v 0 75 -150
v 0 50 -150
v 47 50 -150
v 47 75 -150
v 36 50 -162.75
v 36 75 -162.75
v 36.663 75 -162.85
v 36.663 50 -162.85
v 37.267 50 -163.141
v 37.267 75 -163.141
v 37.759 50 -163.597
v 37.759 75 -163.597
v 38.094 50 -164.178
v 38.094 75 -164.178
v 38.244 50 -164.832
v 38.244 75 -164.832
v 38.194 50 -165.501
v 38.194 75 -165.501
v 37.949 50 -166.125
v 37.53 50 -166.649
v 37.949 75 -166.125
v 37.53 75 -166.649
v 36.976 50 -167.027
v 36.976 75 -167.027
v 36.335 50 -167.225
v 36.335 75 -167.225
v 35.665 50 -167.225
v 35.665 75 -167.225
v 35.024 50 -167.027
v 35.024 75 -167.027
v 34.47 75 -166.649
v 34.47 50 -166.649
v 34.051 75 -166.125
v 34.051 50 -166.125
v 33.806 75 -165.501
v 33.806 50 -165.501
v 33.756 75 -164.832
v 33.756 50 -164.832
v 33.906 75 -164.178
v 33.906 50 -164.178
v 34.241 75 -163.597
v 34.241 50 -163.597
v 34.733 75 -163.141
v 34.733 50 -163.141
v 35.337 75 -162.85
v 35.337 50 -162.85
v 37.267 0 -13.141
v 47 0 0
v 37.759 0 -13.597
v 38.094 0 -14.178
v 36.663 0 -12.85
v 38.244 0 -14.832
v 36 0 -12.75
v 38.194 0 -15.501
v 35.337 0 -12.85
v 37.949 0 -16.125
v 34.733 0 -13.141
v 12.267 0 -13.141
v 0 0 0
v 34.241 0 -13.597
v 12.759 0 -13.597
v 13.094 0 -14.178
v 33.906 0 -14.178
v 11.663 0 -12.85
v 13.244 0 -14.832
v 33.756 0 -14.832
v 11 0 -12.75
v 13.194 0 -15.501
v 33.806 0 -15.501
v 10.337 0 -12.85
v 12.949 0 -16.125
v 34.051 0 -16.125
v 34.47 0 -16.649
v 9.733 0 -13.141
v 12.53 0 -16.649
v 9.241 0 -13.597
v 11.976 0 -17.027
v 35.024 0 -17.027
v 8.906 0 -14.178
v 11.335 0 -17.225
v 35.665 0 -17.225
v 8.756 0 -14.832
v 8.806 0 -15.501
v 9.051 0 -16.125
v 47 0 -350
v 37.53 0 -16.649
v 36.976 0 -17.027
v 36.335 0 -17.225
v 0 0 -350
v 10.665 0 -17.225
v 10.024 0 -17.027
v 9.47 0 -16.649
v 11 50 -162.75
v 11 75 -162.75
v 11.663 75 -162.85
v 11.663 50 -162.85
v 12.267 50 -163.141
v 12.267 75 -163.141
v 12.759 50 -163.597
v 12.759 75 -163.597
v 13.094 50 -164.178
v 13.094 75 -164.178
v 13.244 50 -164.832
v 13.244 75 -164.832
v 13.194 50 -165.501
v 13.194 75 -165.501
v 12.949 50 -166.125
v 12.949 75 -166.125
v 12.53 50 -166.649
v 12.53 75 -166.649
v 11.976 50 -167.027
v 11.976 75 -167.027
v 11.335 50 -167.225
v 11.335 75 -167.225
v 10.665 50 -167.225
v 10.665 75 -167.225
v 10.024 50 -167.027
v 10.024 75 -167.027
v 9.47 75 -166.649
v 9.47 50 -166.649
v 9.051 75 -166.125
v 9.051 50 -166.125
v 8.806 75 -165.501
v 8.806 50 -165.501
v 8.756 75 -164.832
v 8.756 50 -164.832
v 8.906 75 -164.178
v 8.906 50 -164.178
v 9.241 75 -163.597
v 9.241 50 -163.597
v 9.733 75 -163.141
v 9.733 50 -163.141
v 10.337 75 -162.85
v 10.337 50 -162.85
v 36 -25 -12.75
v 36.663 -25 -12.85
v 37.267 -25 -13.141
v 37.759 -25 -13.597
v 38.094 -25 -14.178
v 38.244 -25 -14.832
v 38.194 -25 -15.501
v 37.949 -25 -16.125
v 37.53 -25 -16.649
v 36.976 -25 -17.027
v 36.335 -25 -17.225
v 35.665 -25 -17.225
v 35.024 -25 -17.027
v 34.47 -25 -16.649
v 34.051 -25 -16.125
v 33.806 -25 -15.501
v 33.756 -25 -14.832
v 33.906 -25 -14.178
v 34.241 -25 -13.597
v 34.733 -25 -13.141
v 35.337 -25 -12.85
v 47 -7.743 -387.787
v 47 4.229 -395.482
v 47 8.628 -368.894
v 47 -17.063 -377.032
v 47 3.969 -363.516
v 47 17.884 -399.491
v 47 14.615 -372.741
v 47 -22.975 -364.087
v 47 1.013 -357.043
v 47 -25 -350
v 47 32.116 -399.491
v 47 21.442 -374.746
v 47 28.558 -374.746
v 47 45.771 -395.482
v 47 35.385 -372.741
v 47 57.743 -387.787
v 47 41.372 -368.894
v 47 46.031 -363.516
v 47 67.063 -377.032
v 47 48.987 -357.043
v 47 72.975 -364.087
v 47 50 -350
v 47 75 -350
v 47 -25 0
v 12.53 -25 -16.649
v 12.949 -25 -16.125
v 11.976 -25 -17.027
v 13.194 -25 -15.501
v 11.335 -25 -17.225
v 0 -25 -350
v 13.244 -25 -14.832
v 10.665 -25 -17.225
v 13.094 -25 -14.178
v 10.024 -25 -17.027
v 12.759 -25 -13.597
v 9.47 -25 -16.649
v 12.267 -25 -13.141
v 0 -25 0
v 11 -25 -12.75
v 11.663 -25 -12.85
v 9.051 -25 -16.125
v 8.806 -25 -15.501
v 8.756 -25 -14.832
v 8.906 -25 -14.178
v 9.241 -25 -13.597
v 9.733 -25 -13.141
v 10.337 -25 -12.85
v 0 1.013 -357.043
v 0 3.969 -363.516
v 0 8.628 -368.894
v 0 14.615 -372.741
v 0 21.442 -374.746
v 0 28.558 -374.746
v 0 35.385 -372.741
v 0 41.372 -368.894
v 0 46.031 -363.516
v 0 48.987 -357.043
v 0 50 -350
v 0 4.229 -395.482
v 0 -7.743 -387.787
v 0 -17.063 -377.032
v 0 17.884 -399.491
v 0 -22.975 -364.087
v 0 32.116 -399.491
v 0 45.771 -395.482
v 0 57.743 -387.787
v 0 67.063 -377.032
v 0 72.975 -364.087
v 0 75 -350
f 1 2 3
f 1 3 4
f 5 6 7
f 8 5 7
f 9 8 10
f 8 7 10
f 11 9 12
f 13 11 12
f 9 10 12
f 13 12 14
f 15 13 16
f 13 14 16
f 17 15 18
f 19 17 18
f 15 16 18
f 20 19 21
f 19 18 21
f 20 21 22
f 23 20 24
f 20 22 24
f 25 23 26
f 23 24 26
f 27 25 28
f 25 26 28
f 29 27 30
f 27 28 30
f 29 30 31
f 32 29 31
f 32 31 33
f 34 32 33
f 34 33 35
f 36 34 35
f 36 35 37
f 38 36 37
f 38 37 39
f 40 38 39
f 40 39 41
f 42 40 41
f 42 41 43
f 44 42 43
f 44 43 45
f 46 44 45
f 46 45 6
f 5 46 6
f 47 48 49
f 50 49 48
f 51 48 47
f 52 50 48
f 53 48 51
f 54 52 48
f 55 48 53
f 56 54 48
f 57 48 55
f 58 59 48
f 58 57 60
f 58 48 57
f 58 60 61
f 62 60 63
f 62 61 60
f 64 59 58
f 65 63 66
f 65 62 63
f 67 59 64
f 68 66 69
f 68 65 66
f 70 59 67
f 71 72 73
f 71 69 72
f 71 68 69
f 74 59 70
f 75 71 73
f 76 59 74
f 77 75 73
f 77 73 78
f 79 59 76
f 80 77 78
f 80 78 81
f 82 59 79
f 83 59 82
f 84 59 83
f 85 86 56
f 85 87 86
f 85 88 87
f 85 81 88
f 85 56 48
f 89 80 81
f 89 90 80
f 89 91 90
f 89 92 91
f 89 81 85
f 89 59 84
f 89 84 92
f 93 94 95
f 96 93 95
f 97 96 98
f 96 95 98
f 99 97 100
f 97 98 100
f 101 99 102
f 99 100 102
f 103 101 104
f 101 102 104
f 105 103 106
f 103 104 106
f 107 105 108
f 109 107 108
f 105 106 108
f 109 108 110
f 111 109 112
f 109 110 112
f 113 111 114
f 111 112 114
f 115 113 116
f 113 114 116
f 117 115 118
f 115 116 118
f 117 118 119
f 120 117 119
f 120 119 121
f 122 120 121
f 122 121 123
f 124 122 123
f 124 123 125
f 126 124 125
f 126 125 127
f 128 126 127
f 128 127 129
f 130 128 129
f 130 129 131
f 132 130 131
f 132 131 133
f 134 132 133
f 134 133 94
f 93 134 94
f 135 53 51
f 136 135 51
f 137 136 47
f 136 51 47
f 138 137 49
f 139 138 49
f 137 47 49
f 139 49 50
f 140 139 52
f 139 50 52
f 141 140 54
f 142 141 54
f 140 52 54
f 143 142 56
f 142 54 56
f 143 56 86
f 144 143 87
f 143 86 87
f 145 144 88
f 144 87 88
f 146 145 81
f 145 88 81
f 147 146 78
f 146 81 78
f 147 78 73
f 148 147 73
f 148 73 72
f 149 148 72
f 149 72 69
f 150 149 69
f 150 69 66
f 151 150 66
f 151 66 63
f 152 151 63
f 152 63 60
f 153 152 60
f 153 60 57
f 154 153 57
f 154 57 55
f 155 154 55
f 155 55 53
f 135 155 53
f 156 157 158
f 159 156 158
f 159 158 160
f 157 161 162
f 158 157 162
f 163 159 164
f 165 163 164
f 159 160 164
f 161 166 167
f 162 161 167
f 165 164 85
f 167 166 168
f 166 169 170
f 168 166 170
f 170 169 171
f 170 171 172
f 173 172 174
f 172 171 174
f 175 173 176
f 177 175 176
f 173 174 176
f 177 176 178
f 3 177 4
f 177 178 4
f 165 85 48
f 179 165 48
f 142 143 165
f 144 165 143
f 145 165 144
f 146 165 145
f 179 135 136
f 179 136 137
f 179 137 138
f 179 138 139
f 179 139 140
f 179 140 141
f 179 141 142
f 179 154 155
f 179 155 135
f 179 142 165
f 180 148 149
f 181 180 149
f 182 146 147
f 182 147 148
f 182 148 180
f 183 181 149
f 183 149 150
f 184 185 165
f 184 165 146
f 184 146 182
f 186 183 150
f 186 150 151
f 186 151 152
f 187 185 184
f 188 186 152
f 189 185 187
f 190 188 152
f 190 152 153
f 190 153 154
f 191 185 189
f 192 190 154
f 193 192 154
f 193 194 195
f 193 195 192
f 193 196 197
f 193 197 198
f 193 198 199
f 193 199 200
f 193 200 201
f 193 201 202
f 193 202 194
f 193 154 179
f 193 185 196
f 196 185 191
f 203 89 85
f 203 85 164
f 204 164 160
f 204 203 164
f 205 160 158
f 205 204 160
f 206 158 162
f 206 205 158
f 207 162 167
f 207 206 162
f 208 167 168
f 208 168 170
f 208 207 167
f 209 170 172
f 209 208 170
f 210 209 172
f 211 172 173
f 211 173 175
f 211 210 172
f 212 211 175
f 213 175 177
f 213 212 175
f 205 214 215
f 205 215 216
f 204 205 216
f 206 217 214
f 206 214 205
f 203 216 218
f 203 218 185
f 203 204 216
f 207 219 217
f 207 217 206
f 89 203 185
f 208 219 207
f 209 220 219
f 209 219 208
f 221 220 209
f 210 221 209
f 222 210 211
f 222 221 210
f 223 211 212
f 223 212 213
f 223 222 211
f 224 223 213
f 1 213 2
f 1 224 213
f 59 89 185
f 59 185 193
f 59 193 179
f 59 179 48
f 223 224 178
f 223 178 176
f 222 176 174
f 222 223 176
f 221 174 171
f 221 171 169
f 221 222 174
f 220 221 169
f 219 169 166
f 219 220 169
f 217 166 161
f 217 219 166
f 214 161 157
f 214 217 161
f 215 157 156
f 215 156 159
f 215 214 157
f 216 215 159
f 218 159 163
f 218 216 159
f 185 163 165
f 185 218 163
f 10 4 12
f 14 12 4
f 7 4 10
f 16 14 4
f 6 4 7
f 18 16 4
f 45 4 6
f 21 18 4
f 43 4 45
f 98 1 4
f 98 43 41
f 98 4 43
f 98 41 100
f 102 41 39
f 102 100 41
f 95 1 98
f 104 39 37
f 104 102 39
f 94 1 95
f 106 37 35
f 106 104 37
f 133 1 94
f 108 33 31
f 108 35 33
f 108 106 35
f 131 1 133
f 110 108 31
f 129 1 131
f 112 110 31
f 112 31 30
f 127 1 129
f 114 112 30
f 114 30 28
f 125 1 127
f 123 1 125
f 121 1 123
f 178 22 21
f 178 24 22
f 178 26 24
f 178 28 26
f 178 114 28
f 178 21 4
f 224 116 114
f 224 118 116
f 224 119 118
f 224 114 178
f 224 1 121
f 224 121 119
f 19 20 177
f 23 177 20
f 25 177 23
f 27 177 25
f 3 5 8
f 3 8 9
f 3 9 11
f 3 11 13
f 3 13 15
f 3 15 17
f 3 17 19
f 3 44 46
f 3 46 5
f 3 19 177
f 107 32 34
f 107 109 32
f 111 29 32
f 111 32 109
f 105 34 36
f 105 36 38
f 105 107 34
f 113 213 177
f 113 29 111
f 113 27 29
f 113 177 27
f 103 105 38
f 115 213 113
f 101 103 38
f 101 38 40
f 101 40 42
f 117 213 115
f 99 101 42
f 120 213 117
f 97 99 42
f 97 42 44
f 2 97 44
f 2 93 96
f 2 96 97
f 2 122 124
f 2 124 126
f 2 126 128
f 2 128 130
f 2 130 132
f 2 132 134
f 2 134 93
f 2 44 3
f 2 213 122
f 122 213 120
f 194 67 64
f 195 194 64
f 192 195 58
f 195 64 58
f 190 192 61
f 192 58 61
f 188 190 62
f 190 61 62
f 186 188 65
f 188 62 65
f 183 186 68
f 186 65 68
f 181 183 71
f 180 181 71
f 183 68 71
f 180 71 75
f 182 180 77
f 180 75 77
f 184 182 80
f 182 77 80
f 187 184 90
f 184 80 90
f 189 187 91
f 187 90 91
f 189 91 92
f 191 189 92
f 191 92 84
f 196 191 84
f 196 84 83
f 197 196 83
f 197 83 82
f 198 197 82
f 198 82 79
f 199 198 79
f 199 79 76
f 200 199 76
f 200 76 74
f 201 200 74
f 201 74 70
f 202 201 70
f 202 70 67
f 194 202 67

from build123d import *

# Parameters (mm, degrees)
EXTRUDE_1_DEPTH     = 47
SKETCH_2_R          = 2.25
CUT_EXTRUDE_1_DEPTH = 90
SKETCH_3_R          = 2.25
CUT_EXTRUDE_2_DEPTH = 40


with BuildPart() as part:
    # 草图1 → 凸台-拉伸1 (new body)
    with BuildSketch(Plane(origin=(0, 0, 0), x_dir=(0, 0, -1), z_dir=(1, 0, 0))):
        with BuildLine():
            Line((0, 0), (350, 0))
            ThreePointArc((350, 0), (375, 25), (350, 50))
            Line((350, 50), (150, 50))
            Line((150, 50), (150, 75))
            Line((150, 75), (350, 75))
            ThreePointArc((350, 75), (400, 25), (350, -25))
            Line((350, -25), (0, -25))
            Line((0, -25), (0, 0))
        make_face()
    extrude(amount=EXTRUDE_1_DEPTH)

    # 草图2 → 切除-拉伸1 (cut)
    with BuildSketch(Plane(origin=(0, 0, 0), x_dir=(1, 0, 0), z_dir=(0, 1, 0))):
        with Locations(Location((36, 15, 0), (0, 0, 270))):
            Circle(SKETCH_2_R)
        with Locations(Location((11, 15, 0), (0, 0, 270))):
            Circle(SKETCH_2_R)
    extrude(amount=-CUT_EXTRUDE_1_DEPTH, mode=Mode.SUBTRACT)

    # 草图3 → 切除-拉伸2 (cut)
    with BuildSketch(Plane(origin=(0, 75, 0), x_dir=(1, 0, 0), z_dir=(0, 1, 0))):
        with Locations(Location((11, 165, 0), (0, 0, 270))):
            Circle(SKETCH_3_R)
        with Locations(Location((36, 165, 0), (0, 0, 270))):
            Circle(SKETCH_3_R)
    extrude(amount=-CUT_EXTRUDE_2_DEPTH, mode=Mode.SUBTRACT)


solid = part.part
